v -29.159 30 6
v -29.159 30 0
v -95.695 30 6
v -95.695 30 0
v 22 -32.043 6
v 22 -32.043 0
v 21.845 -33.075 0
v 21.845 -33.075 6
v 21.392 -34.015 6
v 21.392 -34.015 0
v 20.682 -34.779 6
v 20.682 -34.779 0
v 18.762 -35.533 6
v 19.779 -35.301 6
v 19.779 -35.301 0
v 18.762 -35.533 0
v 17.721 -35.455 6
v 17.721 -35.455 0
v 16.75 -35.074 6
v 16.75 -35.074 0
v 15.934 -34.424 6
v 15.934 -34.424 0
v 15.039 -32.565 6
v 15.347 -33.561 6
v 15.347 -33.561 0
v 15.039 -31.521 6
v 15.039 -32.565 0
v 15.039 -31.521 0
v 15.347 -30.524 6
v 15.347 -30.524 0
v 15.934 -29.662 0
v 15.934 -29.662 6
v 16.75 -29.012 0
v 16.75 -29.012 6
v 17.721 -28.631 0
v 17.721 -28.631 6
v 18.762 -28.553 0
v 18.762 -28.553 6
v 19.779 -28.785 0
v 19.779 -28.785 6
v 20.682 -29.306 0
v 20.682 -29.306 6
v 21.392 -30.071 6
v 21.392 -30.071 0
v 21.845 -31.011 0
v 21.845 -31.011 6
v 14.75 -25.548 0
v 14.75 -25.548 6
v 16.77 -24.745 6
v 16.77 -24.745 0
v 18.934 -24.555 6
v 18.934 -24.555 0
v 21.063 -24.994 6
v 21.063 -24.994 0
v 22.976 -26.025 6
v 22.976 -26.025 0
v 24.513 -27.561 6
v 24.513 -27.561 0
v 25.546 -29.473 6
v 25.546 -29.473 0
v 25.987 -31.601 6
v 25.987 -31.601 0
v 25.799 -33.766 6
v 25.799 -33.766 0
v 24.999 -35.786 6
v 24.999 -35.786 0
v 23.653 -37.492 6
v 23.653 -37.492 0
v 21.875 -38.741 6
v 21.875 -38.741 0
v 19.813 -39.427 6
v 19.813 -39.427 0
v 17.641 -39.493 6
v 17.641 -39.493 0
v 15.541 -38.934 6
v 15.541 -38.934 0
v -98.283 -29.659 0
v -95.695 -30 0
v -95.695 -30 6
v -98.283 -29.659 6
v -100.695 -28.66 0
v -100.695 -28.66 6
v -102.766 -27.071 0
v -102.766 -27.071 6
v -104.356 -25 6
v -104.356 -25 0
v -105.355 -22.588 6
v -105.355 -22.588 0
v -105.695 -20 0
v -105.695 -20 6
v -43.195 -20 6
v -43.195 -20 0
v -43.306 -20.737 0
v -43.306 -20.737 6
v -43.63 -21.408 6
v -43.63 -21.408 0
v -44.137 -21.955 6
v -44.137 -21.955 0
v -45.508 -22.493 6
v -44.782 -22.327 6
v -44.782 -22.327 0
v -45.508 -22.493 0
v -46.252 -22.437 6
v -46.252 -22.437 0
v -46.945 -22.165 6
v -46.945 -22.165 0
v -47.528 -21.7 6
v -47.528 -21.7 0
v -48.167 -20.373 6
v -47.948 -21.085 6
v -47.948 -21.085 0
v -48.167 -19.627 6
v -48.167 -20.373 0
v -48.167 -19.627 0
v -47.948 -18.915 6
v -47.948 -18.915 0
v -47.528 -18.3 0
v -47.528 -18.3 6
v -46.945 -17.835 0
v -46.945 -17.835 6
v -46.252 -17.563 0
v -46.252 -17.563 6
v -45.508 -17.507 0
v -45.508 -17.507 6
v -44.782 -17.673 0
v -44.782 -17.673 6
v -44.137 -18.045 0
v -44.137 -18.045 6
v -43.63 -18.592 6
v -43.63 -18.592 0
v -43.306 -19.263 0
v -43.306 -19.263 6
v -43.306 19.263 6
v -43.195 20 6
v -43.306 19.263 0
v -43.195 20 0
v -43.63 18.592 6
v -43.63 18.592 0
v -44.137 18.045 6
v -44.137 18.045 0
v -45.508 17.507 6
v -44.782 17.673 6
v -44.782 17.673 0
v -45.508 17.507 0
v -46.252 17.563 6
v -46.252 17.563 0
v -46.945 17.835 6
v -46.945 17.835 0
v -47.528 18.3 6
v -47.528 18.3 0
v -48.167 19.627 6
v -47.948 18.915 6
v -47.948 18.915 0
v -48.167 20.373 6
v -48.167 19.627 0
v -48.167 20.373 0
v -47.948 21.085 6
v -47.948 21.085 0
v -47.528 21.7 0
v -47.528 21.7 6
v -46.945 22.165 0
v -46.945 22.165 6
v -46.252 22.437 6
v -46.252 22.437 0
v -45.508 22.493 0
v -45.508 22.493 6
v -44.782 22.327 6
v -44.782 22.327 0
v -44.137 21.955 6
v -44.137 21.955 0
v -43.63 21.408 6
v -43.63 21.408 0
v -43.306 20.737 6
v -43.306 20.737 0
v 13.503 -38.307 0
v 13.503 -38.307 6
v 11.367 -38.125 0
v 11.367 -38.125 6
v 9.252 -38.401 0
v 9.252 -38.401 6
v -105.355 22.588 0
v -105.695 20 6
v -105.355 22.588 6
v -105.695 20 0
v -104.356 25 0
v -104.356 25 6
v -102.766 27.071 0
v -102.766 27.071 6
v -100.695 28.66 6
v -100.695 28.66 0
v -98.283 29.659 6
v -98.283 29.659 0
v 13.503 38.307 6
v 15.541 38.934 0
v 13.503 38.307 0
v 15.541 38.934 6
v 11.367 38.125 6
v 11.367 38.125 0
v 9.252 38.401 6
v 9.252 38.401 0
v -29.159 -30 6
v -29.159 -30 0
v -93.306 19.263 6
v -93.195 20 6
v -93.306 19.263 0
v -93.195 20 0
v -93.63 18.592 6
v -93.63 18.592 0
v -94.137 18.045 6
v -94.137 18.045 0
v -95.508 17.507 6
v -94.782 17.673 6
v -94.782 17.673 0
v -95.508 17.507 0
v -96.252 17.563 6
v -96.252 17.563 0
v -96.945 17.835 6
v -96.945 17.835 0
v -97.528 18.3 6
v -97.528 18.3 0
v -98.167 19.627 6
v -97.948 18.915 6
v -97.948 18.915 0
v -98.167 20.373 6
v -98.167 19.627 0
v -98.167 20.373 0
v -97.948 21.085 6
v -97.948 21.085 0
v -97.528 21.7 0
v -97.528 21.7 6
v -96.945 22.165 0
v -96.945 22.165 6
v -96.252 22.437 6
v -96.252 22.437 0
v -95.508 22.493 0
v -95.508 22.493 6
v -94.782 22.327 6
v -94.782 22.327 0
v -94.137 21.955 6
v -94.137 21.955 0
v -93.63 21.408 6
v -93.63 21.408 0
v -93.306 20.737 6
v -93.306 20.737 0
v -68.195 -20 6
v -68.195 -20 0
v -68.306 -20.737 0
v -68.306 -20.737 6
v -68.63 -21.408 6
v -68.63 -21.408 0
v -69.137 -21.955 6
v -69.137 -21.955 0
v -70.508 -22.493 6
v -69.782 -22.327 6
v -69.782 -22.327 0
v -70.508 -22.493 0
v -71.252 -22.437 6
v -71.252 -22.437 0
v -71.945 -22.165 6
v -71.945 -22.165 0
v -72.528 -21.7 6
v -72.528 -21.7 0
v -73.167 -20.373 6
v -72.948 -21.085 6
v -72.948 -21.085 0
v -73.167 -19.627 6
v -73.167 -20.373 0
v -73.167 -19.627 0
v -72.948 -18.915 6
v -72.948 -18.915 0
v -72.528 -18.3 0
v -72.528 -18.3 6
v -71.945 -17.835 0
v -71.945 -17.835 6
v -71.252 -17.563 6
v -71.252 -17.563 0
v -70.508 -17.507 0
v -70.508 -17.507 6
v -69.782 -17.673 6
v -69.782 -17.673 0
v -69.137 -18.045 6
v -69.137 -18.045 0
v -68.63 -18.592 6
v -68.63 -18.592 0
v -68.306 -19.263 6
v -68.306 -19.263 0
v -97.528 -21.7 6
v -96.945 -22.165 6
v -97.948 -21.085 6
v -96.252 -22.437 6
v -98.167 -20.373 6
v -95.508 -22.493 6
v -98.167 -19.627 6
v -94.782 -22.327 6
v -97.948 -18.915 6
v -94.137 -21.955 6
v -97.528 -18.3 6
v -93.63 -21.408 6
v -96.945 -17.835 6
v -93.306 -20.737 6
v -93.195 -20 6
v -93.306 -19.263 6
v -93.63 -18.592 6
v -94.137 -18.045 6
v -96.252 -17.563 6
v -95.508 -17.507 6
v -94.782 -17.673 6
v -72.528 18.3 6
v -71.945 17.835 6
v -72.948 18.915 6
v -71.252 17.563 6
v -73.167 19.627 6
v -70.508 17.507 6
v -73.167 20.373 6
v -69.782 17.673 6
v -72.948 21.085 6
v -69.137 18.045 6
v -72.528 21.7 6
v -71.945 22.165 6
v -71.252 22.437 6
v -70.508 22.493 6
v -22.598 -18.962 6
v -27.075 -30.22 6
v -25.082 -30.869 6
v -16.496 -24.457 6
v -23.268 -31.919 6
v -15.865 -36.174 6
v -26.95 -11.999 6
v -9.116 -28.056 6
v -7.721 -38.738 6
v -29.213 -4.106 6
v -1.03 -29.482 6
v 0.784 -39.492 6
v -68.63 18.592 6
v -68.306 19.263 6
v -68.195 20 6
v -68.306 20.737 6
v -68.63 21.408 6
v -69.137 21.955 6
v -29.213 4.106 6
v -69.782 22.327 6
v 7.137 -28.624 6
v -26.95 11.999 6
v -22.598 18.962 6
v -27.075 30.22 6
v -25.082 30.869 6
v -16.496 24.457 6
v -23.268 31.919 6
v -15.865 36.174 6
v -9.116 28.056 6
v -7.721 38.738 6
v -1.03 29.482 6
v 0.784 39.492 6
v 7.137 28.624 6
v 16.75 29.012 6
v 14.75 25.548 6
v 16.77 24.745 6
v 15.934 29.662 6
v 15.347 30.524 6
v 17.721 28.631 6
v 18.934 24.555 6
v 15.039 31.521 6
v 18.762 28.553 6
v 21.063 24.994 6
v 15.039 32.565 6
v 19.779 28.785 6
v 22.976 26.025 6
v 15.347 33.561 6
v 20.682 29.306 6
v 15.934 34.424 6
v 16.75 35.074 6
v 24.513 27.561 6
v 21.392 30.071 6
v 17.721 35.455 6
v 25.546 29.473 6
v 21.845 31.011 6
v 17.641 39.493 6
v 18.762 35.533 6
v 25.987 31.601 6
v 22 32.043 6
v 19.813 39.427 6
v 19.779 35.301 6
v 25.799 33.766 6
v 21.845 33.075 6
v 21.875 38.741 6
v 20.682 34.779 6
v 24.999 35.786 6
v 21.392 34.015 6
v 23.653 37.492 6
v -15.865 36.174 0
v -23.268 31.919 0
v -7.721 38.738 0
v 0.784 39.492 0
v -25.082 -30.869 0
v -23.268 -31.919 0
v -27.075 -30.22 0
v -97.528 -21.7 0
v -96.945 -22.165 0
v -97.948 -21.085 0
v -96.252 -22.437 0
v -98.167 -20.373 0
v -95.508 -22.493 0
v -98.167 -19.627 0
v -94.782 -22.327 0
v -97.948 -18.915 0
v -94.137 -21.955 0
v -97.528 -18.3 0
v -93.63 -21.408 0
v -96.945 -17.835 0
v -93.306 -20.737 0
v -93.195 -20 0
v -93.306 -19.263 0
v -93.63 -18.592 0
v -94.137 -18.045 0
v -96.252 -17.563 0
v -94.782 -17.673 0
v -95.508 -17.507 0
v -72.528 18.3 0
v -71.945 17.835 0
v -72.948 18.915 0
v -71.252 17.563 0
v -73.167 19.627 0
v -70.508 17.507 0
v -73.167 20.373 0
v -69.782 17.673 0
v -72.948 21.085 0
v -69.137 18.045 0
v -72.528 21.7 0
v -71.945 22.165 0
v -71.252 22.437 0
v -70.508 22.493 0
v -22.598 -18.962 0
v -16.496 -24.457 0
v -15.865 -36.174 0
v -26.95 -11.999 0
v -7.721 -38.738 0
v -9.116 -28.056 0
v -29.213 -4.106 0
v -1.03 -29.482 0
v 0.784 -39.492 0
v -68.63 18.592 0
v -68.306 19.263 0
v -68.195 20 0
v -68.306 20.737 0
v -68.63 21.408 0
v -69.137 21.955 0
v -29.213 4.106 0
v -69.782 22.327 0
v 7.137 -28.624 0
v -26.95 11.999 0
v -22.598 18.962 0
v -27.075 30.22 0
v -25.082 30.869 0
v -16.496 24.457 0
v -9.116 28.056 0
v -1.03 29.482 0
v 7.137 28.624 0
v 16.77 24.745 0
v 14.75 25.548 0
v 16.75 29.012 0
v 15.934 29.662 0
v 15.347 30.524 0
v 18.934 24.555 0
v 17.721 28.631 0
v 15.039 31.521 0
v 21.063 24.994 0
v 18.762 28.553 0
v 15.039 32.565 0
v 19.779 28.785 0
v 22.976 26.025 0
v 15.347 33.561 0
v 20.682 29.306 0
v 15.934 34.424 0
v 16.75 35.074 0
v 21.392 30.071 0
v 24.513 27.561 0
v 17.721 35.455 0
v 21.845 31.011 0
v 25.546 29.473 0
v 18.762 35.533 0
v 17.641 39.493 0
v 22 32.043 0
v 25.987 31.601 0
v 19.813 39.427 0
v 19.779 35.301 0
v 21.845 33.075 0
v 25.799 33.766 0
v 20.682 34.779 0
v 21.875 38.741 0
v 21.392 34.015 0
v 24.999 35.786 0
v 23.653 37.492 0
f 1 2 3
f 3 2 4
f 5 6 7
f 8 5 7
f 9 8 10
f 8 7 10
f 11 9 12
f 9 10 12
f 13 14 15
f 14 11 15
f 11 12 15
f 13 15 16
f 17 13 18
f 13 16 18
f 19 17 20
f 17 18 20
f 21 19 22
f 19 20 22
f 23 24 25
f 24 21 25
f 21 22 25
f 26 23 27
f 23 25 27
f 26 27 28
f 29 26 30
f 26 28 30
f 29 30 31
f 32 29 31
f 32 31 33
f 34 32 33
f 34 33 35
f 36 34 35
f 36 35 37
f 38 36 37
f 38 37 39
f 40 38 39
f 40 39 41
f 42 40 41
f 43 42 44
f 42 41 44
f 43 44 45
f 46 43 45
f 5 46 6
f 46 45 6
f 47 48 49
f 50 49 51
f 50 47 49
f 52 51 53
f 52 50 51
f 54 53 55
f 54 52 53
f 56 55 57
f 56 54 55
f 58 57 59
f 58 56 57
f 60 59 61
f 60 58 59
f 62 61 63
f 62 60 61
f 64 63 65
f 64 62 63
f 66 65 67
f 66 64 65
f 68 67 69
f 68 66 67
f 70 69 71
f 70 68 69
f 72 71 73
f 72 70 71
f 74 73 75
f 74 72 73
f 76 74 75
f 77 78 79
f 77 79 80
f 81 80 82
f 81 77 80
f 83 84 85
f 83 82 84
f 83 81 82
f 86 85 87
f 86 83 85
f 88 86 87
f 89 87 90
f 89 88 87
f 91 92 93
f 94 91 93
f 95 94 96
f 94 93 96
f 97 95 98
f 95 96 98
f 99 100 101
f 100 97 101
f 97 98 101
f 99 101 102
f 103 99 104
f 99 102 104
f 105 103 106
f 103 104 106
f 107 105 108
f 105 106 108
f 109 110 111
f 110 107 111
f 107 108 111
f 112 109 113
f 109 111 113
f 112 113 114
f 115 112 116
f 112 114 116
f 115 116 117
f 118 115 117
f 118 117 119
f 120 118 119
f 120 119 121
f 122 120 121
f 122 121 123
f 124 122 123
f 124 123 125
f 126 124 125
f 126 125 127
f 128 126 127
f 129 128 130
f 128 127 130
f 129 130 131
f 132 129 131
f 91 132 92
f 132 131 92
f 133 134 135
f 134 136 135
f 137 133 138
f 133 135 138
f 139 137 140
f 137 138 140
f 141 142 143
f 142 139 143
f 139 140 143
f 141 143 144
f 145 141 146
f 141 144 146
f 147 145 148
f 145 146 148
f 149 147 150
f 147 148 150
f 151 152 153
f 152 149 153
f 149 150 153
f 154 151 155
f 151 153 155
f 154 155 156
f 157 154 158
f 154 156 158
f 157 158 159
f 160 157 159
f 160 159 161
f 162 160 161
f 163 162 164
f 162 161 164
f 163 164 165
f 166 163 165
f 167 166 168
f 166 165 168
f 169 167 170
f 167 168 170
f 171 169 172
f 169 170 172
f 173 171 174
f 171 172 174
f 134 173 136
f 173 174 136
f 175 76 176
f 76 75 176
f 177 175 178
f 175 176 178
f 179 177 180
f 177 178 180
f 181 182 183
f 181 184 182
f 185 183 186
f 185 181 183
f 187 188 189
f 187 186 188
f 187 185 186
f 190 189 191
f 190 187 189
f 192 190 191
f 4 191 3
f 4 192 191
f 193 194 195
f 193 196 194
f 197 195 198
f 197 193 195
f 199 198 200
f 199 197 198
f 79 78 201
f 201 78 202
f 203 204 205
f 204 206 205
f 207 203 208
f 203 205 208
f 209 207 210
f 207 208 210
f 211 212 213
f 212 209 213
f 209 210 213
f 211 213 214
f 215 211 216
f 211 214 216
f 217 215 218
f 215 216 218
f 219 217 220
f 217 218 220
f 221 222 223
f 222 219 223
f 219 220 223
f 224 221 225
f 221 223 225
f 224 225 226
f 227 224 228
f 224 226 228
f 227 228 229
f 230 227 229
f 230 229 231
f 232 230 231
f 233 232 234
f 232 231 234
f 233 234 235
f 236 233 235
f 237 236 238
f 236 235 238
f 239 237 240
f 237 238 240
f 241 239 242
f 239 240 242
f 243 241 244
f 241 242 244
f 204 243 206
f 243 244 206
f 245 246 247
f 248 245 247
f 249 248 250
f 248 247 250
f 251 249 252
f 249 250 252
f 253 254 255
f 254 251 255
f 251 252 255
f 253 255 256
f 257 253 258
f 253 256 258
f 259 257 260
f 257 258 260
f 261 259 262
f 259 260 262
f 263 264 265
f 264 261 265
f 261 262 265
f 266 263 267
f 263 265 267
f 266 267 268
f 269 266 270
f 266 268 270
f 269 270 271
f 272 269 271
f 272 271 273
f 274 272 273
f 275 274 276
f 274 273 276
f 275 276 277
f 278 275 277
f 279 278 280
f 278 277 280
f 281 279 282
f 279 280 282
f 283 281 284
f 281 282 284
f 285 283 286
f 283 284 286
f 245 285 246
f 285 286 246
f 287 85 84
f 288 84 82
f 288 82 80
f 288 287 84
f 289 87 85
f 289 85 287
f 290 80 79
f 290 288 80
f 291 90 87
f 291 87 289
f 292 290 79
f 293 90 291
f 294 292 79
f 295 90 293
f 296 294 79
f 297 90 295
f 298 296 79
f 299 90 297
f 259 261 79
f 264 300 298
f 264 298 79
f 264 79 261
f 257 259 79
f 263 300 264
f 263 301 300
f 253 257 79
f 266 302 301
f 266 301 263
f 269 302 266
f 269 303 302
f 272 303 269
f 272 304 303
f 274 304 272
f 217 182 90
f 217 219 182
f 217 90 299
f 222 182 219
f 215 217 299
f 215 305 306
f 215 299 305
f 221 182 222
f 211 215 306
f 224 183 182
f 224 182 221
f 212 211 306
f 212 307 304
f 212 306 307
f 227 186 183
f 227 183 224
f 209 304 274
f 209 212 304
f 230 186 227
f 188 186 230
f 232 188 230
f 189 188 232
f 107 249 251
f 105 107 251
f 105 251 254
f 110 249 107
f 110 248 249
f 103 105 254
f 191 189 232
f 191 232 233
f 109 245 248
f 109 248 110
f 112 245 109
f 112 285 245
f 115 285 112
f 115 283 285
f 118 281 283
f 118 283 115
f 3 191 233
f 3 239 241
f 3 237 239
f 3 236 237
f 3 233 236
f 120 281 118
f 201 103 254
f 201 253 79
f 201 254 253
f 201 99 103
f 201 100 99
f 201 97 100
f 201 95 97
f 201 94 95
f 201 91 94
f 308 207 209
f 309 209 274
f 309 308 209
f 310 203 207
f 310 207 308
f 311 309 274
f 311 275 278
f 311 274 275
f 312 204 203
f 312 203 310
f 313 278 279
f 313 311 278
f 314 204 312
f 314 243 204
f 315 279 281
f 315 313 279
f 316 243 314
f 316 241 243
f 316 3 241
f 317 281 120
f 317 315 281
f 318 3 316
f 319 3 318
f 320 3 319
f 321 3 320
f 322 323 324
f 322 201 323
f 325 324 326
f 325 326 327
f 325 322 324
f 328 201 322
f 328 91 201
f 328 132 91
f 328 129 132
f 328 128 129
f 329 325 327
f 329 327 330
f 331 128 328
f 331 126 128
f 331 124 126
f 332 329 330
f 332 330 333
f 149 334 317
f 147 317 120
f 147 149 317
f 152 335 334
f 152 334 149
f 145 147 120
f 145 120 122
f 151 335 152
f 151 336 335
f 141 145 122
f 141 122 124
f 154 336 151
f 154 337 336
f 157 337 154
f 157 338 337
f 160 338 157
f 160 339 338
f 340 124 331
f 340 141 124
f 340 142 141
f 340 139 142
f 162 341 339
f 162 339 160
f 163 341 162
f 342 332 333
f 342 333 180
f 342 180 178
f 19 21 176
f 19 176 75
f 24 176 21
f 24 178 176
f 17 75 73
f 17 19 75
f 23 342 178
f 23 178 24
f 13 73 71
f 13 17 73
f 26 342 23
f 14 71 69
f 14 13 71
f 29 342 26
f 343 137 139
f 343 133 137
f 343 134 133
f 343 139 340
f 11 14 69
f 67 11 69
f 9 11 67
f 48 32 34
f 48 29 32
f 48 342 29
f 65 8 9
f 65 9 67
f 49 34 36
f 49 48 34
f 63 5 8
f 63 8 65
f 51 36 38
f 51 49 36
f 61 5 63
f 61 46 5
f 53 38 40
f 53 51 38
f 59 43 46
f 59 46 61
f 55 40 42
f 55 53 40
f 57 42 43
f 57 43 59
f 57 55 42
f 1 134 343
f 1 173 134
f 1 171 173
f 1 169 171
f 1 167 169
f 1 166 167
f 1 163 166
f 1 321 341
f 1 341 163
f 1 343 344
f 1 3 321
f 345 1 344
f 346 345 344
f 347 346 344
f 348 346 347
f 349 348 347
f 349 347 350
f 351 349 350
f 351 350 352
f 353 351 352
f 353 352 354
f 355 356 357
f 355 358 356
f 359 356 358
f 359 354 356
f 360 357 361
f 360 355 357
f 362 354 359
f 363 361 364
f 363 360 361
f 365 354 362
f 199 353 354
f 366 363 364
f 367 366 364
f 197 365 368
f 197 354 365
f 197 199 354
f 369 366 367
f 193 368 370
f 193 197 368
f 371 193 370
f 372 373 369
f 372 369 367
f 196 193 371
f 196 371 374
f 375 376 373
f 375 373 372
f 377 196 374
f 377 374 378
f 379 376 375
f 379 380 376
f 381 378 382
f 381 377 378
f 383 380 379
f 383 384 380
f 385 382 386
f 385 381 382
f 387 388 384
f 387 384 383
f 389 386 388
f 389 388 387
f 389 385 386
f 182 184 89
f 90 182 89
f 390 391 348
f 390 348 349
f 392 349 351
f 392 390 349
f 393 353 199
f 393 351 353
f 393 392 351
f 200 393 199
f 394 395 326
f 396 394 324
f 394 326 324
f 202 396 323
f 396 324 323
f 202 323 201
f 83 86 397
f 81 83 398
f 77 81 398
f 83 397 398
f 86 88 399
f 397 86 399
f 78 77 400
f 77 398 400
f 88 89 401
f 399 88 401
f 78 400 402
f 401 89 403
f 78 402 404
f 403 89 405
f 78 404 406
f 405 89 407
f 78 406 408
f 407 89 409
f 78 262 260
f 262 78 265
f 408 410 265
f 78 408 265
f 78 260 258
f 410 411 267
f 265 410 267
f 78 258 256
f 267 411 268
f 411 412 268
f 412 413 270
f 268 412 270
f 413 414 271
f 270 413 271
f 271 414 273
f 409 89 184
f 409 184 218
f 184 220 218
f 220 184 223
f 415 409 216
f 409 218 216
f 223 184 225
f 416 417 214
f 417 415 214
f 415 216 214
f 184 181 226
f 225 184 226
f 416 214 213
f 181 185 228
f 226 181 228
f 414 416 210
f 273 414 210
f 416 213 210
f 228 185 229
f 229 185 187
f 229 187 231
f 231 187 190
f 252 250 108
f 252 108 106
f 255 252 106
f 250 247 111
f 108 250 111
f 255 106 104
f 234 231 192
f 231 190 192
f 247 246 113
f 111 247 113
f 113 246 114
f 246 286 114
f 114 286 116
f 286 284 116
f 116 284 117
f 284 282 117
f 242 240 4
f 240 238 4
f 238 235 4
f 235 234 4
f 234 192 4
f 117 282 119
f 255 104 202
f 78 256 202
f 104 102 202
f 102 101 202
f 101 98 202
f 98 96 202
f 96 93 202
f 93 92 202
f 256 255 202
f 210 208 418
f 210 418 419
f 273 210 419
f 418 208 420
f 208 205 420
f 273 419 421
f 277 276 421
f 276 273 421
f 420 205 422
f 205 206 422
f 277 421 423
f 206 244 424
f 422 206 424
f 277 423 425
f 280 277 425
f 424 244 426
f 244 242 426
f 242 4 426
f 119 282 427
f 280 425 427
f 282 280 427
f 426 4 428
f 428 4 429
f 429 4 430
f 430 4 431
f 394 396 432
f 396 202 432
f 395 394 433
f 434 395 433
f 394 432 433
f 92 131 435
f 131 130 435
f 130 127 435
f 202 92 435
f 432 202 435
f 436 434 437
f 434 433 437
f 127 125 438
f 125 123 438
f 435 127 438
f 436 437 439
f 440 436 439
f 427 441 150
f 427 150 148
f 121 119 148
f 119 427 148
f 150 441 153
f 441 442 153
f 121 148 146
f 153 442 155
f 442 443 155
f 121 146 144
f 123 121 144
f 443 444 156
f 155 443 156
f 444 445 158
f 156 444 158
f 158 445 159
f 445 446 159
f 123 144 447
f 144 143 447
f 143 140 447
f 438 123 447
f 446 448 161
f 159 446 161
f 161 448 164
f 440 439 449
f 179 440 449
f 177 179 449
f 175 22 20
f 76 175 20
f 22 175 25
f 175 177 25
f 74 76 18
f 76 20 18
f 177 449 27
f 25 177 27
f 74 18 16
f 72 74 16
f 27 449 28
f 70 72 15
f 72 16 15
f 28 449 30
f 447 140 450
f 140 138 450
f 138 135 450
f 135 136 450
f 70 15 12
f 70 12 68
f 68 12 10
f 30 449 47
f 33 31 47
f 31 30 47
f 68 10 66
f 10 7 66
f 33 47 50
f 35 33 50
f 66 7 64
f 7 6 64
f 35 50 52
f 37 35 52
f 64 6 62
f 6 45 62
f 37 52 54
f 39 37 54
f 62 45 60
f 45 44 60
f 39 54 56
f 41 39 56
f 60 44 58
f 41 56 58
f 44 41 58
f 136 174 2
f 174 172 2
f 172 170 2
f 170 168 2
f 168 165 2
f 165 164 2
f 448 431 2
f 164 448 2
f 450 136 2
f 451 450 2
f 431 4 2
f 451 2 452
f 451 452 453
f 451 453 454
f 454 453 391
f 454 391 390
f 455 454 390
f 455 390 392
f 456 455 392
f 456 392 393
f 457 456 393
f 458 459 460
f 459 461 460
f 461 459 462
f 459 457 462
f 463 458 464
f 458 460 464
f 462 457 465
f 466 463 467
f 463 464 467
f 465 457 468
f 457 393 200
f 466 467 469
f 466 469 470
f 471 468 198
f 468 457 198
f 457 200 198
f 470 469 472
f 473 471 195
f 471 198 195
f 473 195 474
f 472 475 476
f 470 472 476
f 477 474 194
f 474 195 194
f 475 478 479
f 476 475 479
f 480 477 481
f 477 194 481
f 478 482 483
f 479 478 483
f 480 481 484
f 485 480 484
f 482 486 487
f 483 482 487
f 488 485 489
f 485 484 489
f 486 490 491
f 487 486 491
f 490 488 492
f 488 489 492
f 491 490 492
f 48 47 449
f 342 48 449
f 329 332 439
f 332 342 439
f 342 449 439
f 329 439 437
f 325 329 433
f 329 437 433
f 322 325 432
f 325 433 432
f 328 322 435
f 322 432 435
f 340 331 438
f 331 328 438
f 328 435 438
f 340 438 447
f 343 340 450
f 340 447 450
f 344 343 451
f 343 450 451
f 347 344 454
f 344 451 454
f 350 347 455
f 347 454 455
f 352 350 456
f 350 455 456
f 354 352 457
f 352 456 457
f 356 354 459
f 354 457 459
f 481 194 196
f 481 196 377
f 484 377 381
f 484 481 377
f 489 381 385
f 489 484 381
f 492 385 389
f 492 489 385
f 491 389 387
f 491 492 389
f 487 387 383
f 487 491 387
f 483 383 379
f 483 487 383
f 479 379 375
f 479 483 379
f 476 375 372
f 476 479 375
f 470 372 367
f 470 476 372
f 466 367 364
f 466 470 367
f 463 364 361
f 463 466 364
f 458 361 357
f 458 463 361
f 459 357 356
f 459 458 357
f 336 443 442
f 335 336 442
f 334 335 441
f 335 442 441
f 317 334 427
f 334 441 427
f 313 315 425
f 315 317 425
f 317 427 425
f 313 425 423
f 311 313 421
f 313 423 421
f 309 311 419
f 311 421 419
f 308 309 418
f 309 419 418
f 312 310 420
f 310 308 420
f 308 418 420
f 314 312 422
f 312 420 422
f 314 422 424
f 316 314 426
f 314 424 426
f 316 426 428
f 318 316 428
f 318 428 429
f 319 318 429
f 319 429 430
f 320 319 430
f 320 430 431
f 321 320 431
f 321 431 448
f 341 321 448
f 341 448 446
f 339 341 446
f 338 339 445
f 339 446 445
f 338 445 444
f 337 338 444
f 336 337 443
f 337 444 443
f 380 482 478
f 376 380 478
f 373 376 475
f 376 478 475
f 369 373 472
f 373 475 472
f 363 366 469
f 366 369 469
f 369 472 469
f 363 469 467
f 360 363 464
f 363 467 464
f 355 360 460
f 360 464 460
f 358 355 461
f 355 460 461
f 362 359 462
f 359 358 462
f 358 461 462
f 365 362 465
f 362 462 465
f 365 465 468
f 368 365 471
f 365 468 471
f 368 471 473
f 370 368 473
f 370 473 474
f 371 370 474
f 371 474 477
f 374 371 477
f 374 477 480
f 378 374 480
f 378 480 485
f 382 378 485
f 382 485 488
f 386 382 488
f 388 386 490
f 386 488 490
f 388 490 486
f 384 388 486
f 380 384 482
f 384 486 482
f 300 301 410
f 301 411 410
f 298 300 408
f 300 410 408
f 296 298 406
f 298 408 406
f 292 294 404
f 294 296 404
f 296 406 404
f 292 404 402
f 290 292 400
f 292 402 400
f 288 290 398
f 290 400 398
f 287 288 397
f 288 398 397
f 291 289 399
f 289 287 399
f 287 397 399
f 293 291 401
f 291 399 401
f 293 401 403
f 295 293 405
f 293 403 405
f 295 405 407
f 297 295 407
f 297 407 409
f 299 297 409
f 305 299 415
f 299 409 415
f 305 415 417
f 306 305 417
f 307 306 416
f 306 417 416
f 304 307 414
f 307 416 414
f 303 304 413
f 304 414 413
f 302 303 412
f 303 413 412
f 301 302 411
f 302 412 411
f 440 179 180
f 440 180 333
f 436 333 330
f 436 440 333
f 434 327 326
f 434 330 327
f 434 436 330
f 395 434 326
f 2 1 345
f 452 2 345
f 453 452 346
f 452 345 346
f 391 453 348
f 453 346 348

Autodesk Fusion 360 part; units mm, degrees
sketch "Sketch1" plane through (0, 0, 0) normal (0, 0, 1) x (1, 0, 0)
  circle A0 centre (18.5, 32.0429) radius 7.5
  circle A1 centre (18.5, -32.0429) radius 7.5
  line L0 (0, 0) -> (80.5902, 0) construction
  line L1 (0, 0) -> (18.5, 32.0429) construction
  arc A2 (14.75, 25.5477) -> (14.75, -25.5477) centre (0, 0) ccw
  arc A3 (13.1121, 37.2602) -> (13.1121, -37.2602) centre (0, 0) ccw
  line L2 (-25.6953, 30) -> (-95.6953, 30)
  line L3 (-95.6953, -30) -> (-25.6953, -30)
  line L4 (0, 0) -> (-230.6084, 0) construction
  circle A4 centre (18.5, 32.0429) radius 3.5
  circle A5 centre (18.5, -32.0429) radius 3.5
  line L5 (-105.6953, 20) -> (-105.6953, -20)
  arc A6 (-95.6953, 30) -> (-105.6953, 20) centre (-95.6953, 20) ccw
  arc A7 (-105.6953, -20) -> (-95.6953, -30) centre (-95.6953, -20) ccw
  circle A8 centre (-95.6953, 20) radius 2.5
  circle A9 centre (-95.6953, -20) radius 2.5
  circle A10 centre (-45.6953, -20) radius 2.5
  circle A11 centre (-45.6953, 20) radius 2.5
  circle A12 centre (-70.6953, 20) radius 2.5
  circle A13 centre (-70.6953, -20) radius 2.5
  point P0 (-105.6953, 30)
  point P1 (-105.6953, -30)
  dimension "d1" = 59
  dimension "d2" = 10
  dimension "d3" = 60
  dimension "d4" = 15
  dimension "d5" = 60
  dimension "d23" = 7
  dimension "d25" = 80
  dimension "d26" = 10
  dimension "d27" = 5
  dimension "d28" = 5
  dimension "d29" = 50
  dimension "d30" = 25
extrude "Extrude1" add sketch "Sketch1" along normal blind 6
fillet "Fillet1" radius 10 4 edges at (13.1121, 37.2602, 3) (-25.6953, 30, 3) (13.1121, -37.2602, 3) (-25.6953, -30, 3)
